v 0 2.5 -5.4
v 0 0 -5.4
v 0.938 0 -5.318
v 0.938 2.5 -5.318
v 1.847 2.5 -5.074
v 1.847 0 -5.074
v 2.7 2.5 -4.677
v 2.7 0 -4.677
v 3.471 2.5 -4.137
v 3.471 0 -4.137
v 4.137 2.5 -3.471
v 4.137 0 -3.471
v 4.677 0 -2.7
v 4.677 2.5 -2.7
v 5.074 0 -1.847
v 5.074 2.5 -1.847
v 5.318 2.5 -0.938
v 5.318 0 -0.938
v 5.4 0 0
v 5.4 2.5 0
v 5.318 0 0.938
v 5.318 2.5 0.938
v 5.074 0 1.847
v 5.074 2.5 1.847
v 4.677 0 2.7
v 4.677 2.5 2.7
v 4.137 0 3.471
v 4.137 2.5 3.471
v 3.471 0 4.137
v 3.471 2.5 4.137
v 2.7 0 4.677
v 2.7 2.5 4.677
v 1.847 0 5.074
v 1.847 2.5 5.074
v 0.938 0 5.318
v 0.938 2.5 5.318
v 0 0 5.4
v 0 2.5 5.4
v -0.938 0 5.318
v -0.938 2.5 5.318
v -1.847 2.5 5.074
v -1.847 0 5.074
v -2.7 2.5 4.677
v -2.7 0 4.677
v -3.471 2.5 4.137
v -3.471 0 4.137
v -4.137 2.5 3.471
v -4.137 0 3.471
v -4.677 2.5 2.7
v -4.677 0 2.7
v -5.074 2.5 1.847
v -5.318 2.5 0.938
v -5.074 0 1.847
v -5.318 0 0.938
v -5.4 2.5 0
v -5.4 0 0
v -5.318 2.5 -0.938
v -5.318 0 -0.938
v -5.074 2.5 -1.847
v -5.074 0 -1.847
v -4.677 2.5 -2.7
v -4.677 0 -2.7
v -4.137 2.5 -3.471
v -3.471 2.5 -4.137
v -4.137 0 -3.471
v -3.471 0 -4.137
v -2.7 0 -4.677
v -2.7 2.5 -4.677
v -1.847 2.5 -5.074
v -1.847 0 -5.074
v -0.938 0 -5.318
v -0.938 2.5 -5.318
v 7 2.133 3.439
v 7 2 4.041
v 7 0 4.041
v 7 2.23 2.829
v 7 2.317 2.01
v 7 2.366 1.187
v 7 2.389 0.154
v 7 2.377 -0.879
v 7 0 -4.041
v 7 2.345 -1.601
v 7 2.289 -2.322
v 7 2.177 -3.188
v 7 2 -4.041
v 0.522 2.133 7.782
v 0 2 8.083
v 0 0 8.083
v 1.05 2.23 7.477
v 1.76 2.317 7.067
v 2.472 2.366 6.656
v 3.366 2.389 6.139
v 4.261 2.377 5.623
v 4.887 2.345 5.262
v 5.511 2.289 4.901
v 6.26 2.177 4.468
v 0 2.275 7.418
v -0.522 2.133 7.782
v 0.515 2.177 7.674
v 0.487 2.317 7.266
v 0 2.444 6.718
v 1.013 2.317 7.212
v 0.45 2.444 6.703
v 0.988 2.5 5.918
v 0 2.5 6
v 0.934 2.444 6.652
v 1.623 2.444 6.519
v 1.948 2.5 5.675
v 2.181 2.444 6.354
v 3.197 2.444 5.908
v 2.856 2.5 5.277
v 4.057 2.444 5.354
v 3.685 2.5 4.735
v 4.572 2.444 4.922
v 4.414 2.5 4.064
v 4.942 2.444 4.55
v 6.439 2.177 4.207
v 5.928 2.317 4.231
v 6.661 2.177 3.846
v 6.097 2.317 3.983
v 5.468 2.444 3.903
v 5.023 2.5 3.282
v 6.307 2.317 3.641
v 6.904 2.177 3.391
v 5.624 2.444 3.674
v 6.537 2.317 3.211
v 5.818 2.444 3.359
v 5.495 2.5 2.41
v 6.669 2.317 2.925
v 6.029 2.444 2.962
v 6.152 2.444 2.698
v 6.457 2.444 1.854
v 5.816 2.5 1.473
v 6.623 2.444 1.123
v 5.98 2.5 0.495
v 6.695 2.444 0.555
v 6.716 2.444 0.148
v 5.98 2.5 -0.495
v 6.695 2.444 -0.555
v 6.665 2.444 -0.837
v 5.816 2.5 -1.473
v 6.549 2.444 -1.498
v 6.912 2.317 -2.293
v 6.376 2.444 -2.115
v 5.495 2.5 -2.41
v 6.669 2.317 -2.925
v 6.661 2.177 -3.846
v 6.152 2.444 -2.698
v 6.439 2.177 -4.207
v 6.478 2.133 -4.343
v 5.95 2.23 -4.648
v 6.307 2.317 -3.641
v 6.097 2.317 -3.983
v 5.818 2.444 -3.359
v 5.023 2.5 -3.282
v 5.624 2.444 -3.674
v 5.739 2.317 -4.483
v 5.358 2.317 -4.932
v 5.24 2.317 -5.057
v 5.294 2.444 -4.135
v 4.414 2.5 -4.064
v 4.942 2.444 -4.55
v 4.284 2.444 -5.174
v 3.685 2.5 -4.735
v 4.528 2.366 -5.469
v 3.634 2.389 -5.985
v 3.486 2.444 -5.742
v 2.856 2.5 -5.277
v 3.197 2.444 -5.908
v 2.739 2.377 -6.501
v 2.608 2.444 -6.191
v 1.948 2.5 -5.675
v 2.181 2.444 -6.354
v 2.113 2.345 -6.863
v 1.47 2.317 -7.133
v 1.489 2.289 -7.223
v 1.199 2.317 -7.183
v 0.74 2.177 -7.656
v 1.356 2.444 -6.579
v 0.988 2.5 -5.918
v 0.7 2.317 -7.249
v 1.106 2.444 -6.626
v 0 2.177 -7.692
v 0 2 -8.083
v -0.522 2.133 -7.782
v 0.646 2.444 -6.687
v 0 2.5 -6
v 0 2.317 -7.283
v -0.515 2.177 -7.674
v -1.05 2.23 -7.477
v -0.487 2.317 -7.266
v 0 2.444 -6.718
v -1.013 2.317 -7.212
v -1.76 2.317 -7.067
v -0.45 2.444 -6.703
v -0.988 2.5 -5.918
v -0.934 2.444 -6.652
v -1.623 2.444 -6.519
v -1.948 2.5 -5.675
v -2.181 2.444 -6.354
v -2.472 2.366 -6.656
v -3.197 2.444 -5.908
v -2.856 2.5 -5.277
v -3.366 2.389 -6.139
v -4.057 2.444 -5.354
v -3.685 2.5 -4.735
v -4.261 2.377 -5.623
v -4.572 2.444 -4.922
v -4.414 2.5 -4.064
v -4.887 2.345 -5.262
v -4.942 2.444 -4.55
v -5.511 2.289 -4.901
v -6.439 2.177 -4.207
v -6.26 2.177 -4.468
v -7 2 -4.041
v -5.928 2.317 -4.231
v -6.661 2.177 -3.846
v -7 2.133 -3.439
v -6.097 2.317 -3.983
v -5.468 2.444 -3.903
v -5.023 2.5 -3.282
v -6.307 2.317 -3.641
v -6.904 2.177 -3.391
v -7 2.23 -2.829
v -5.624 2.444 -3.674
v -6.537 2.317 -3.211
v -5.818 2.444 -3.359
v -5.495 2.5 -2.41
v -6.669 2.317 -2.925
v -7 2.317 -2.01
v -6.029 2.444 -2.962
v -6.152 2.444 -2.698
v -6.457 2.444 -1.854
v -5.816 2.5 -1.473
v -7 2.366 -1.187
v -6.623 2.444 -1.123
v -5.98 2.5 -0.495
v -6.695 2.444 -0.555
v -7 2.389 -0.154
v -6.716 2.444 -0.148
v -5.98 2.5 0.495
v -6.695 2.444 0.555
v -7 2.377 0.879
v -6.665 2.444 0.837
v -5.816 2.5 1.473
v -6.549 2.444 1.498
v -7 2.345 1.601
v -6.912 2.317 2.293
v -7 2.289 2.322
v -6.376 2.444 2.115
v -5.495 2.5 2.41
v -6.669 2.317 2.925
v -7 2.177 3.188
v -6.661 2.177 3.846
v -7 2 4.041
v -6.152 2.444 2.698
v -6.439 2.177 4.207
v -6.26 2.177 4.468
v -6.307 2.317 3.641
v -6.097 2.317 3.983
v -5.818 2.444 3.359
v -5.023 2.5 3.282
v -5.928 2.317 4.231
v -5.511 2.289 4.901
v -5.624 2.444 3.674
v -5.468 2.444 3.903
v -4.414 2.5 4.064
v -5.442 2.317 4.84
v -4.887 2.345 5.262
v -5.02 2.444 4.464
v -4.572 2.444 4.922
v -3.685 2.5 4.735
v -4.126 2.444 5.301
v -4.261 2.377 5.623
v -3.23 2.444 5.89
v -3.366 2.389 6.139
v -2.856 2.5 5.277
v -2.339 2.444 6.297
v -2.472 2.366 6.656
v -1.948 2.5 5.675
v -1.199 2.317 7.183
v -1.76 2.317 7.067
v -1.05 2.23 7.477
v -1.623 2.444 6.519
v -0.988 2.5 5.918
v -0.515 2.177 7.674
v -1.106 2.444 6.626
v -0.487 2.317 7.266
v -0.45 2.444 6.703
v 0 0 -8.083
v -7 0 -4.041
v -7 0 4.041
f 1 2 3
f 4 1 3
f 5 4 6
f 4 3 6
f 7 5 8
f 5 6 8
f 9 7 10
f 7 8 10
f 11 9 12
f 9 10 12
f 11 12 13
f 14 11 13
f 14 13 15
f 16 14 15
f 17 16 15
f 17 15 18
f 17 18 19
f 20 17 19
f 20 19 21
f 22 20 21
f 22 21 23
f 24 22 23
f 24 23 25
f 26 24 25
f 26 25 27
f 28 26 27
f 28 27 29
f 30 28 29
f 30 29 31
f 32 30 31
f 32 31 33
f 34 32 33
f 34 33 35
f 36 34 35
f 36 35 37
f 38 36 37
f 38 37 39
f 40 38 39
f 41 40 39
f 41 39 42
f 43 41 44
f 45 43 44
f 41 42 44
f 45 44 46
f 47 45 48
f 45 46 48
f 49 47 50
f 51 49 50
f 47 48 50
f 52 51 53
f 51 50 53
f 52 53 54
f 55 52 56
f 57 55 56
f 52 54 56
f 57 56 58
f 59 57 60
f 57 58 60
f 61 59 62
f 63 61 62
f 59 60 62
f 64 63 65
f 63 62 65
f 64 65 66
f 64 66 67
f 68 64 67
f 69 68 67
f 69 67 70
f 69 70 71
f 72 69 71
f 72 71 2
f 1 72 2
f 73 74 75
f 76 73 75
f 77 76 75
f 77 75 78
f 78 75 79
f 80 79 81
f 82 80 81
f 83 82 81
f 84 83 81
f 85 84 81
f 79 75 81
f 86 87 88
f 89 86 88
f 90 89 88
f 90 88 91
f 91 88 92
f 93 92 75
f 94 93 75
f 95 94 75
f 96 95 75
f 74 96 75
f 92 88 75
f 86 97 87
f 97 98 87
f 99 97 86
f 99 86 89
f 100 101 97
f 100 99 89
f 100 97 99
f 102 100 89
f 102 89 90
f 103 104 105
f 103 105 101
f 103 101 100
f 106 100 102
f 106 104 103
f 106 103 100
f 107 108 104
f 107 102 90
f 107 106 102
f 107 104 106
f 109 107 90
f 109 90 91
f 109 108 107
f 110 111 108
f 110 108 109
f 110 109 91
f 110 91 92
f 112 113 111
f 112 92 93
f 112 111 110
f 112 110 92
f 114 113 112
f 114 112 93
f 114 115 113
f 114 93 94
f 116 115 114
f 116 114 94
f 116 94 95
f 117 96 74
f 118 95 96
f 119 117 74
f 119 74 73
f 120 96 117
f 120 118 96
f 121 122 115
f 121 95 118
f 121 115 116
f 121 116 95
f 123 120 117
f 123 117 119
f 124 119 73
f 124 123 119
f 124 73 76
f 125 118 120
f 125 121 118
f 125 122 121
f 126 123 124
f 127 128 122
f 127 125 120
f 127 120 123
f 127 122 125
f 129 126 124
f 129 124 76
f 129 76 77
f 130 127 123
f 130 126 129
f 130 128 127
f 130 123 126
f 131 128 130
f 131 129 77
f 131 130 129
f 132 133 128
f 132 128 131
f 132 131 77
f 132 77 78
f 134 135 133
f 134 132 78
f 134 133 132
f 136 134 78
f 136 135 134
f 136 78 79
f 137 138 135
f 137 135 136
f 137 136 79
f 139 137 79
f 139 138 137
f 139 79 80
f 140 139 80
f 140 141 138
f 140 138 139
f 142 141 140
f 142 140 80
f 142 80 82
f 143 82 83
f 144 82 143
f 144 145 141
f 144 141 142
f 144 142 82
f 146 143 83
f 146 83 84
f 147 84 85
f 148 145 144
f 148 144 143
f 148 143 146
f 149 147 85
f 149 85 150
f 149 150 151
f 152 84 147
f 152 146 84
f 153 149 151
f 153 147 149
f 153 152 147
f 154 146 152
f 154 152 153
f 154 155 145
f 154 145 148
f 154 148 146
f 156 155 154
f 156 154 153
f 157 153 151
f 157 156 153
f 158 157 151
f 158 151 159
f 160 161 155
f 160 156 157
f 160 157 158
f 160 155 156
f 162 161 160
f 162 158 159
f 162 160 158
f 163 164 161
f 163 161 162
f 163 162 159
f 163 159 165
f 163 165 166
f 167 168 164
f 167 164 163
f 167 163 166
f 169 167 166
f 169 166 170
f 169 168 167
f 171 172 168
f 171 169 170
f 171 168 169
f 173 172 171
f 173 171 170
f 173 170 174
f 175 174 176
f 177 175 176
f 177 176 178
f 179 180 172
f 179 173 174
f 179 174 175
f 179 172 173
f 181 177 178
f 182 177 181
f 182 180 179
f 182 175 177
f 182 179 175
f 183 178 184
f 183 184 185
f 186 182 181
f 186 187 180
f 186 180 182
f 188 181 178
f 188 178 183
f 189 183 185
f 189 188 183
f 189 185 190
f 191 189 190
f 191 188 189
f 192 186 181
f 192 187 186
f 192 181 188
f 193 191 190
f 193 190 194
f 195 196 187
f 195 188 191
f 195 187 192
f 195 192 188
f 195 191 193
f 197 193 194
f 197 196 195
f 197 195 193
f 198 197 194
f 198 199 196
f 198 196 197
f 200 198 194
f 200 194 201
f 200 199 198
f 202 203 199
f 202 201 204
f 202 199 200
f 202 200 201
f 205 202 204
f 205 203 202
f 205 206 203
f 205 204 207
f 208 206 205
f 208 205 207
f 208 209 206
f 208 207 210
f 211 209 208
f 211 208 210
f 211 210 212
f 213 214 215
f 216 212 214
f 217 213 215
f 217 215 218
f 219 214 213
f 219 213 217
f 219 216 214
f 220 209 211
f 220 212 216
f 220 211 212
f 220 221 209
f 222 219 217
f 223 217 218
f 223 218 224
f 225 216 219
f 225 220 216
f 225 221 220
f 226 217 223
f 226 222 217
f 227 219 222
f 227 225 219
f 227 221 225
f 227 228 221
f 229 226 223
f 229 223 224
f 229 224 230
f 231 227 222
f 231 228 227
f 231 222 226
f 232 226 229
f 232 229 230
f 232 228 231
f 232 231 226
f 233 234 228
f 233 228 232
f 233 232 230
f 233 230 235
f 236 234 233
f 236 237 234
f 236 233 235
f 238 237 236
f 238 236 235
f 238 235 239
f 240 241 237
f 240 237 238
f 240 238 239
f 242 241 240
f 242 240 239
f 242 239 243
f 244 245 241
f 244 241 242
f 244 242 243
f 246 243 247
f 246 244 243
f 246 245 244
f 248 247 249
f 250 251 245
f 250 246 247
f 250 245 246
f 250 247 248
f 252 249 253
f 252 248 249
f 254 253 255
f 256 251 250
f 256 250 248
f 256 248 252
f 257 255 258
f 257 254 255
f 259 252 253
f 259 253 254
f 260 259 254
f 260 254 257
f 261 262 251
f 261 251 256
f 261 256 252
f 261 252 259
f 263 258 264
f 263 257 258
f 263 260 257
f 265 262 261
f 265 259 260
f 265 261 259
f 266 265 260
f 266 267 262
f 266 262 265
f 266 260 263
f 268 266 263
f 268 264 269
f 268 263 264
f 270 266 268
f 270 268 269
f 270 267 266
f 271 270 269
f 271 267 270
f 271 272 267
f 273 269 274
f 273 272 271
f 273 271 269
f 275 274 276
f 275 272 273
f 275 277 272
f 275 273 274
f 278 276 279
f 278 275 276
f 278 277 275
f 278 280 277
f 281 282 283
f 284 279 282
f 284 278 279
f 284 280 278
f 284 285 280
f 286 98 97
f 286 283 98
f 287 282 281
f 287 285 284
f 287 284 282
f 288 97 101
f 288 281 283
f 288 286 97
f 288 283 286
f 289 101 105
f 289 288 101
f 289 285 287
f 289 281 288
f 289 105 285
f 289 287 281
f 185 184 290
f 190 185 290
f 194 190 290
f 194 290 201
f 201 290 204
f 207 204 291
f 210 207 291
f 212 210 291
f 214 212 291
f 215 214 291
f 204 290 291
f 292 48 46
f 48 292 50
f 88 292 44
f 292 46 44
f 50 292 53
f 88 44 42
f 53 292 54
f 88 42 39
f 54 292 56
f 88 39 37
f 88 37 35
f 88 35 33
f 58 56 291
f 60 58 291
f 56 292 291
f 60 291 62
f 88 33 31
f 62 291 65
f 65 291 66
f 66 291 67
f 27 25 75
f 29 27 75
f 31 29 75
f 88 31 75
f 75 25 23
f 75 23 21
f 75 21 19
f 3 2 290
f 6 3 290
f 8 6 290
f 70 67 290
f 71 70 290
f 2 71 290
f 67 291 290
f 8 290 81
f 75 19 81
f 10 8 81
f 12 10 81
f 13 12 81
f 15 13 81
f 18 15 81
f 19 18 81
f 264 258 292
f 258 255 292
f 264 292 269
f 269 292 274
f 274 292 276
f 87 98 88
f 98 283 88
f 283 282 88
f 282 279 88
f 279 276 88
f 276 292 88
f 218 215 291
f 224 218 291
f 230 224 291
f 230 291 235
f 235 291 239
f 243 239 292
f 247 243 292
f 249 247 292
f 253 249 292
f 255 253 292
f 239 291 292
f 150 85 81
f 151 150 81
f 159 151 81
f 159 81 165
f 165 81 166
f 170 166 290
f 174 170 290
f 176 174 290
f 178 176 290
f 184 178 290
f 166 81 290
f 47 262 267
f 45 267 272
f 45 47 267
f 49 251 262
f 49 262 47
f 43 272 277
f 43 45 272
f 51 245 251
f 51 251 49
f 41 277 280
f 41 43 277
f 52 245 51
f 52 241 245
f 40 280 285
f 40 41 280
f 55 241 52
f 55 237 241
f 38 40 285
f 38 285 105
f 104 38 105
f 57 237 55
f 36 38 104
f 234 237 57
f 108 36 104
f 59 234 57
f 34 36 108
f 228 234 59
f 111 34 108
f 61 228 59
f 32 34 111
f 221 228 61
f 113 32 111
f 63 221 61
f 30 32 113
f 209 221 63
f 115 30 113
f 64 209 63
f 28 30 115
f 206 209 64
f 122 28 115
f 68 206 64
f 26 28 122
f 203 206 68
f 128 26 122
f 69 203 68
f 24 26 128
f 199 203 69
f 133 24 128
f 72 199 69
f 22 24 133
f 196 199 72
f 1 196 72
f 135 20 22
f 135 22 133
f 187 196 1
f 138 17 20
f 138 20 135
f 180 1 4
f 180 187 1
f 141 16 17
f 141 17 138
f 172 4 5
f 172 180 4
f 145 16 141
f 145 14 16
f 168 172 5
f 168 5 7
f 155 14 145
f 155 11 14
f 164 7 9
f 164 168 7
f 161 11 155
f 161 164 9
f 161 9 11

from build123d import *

# Parameters (mm, degrees)
EXTRUDE_1_DEPTH = 2.5
M12X1_252_D     = 10.8


with BuildPart() as part:
    # Эскиз1 → Бобышка-Вытянуть1 (new body)
    with BuildSketch(Plane(origin=(0, 0, 0), x_dir=(1, 0, 0), z_dir=(0, 1, 0))):
        Polygon((0, -8.082903769), (7, -4.041451884), (7, 4.041451884), (0, 8.082903769), (-7, 4.041451884), (-7, -4.041451884), align=None)
    extrude(amount=EXTRUDE_1_DEPTH)

    # Эскиз2 → Вырез-Повернуть1 (revolve, cut)
    with BuildSketch(Plane(origin=(0, 0, 0), x_dir=(0, 0, -1), z_dir=(1, 0, 0))):
        with BuildLine():
            Line((-8.082903769, 2.5), (-8.082903769, 2))
            ThreePointArc((-8.082903769, 2), (-7.071037827, 2.373249344), (-6, 2.5))
            Line((-6, 2.5), (-8.082903769, 2.5))
        make_face()
    revolve(axis=Axis((0, 0, 0), (0, 1, 0)), mode=Mode.SUBTRACT)

    # Отверстие обработанное метчиком M12x1.252 (through all)
    with Locations(Plane.ZX.offset(2.5)):
        with Locations((0, 0)):
            Hole(M12X1_252_D / 2)


solid = part.part
